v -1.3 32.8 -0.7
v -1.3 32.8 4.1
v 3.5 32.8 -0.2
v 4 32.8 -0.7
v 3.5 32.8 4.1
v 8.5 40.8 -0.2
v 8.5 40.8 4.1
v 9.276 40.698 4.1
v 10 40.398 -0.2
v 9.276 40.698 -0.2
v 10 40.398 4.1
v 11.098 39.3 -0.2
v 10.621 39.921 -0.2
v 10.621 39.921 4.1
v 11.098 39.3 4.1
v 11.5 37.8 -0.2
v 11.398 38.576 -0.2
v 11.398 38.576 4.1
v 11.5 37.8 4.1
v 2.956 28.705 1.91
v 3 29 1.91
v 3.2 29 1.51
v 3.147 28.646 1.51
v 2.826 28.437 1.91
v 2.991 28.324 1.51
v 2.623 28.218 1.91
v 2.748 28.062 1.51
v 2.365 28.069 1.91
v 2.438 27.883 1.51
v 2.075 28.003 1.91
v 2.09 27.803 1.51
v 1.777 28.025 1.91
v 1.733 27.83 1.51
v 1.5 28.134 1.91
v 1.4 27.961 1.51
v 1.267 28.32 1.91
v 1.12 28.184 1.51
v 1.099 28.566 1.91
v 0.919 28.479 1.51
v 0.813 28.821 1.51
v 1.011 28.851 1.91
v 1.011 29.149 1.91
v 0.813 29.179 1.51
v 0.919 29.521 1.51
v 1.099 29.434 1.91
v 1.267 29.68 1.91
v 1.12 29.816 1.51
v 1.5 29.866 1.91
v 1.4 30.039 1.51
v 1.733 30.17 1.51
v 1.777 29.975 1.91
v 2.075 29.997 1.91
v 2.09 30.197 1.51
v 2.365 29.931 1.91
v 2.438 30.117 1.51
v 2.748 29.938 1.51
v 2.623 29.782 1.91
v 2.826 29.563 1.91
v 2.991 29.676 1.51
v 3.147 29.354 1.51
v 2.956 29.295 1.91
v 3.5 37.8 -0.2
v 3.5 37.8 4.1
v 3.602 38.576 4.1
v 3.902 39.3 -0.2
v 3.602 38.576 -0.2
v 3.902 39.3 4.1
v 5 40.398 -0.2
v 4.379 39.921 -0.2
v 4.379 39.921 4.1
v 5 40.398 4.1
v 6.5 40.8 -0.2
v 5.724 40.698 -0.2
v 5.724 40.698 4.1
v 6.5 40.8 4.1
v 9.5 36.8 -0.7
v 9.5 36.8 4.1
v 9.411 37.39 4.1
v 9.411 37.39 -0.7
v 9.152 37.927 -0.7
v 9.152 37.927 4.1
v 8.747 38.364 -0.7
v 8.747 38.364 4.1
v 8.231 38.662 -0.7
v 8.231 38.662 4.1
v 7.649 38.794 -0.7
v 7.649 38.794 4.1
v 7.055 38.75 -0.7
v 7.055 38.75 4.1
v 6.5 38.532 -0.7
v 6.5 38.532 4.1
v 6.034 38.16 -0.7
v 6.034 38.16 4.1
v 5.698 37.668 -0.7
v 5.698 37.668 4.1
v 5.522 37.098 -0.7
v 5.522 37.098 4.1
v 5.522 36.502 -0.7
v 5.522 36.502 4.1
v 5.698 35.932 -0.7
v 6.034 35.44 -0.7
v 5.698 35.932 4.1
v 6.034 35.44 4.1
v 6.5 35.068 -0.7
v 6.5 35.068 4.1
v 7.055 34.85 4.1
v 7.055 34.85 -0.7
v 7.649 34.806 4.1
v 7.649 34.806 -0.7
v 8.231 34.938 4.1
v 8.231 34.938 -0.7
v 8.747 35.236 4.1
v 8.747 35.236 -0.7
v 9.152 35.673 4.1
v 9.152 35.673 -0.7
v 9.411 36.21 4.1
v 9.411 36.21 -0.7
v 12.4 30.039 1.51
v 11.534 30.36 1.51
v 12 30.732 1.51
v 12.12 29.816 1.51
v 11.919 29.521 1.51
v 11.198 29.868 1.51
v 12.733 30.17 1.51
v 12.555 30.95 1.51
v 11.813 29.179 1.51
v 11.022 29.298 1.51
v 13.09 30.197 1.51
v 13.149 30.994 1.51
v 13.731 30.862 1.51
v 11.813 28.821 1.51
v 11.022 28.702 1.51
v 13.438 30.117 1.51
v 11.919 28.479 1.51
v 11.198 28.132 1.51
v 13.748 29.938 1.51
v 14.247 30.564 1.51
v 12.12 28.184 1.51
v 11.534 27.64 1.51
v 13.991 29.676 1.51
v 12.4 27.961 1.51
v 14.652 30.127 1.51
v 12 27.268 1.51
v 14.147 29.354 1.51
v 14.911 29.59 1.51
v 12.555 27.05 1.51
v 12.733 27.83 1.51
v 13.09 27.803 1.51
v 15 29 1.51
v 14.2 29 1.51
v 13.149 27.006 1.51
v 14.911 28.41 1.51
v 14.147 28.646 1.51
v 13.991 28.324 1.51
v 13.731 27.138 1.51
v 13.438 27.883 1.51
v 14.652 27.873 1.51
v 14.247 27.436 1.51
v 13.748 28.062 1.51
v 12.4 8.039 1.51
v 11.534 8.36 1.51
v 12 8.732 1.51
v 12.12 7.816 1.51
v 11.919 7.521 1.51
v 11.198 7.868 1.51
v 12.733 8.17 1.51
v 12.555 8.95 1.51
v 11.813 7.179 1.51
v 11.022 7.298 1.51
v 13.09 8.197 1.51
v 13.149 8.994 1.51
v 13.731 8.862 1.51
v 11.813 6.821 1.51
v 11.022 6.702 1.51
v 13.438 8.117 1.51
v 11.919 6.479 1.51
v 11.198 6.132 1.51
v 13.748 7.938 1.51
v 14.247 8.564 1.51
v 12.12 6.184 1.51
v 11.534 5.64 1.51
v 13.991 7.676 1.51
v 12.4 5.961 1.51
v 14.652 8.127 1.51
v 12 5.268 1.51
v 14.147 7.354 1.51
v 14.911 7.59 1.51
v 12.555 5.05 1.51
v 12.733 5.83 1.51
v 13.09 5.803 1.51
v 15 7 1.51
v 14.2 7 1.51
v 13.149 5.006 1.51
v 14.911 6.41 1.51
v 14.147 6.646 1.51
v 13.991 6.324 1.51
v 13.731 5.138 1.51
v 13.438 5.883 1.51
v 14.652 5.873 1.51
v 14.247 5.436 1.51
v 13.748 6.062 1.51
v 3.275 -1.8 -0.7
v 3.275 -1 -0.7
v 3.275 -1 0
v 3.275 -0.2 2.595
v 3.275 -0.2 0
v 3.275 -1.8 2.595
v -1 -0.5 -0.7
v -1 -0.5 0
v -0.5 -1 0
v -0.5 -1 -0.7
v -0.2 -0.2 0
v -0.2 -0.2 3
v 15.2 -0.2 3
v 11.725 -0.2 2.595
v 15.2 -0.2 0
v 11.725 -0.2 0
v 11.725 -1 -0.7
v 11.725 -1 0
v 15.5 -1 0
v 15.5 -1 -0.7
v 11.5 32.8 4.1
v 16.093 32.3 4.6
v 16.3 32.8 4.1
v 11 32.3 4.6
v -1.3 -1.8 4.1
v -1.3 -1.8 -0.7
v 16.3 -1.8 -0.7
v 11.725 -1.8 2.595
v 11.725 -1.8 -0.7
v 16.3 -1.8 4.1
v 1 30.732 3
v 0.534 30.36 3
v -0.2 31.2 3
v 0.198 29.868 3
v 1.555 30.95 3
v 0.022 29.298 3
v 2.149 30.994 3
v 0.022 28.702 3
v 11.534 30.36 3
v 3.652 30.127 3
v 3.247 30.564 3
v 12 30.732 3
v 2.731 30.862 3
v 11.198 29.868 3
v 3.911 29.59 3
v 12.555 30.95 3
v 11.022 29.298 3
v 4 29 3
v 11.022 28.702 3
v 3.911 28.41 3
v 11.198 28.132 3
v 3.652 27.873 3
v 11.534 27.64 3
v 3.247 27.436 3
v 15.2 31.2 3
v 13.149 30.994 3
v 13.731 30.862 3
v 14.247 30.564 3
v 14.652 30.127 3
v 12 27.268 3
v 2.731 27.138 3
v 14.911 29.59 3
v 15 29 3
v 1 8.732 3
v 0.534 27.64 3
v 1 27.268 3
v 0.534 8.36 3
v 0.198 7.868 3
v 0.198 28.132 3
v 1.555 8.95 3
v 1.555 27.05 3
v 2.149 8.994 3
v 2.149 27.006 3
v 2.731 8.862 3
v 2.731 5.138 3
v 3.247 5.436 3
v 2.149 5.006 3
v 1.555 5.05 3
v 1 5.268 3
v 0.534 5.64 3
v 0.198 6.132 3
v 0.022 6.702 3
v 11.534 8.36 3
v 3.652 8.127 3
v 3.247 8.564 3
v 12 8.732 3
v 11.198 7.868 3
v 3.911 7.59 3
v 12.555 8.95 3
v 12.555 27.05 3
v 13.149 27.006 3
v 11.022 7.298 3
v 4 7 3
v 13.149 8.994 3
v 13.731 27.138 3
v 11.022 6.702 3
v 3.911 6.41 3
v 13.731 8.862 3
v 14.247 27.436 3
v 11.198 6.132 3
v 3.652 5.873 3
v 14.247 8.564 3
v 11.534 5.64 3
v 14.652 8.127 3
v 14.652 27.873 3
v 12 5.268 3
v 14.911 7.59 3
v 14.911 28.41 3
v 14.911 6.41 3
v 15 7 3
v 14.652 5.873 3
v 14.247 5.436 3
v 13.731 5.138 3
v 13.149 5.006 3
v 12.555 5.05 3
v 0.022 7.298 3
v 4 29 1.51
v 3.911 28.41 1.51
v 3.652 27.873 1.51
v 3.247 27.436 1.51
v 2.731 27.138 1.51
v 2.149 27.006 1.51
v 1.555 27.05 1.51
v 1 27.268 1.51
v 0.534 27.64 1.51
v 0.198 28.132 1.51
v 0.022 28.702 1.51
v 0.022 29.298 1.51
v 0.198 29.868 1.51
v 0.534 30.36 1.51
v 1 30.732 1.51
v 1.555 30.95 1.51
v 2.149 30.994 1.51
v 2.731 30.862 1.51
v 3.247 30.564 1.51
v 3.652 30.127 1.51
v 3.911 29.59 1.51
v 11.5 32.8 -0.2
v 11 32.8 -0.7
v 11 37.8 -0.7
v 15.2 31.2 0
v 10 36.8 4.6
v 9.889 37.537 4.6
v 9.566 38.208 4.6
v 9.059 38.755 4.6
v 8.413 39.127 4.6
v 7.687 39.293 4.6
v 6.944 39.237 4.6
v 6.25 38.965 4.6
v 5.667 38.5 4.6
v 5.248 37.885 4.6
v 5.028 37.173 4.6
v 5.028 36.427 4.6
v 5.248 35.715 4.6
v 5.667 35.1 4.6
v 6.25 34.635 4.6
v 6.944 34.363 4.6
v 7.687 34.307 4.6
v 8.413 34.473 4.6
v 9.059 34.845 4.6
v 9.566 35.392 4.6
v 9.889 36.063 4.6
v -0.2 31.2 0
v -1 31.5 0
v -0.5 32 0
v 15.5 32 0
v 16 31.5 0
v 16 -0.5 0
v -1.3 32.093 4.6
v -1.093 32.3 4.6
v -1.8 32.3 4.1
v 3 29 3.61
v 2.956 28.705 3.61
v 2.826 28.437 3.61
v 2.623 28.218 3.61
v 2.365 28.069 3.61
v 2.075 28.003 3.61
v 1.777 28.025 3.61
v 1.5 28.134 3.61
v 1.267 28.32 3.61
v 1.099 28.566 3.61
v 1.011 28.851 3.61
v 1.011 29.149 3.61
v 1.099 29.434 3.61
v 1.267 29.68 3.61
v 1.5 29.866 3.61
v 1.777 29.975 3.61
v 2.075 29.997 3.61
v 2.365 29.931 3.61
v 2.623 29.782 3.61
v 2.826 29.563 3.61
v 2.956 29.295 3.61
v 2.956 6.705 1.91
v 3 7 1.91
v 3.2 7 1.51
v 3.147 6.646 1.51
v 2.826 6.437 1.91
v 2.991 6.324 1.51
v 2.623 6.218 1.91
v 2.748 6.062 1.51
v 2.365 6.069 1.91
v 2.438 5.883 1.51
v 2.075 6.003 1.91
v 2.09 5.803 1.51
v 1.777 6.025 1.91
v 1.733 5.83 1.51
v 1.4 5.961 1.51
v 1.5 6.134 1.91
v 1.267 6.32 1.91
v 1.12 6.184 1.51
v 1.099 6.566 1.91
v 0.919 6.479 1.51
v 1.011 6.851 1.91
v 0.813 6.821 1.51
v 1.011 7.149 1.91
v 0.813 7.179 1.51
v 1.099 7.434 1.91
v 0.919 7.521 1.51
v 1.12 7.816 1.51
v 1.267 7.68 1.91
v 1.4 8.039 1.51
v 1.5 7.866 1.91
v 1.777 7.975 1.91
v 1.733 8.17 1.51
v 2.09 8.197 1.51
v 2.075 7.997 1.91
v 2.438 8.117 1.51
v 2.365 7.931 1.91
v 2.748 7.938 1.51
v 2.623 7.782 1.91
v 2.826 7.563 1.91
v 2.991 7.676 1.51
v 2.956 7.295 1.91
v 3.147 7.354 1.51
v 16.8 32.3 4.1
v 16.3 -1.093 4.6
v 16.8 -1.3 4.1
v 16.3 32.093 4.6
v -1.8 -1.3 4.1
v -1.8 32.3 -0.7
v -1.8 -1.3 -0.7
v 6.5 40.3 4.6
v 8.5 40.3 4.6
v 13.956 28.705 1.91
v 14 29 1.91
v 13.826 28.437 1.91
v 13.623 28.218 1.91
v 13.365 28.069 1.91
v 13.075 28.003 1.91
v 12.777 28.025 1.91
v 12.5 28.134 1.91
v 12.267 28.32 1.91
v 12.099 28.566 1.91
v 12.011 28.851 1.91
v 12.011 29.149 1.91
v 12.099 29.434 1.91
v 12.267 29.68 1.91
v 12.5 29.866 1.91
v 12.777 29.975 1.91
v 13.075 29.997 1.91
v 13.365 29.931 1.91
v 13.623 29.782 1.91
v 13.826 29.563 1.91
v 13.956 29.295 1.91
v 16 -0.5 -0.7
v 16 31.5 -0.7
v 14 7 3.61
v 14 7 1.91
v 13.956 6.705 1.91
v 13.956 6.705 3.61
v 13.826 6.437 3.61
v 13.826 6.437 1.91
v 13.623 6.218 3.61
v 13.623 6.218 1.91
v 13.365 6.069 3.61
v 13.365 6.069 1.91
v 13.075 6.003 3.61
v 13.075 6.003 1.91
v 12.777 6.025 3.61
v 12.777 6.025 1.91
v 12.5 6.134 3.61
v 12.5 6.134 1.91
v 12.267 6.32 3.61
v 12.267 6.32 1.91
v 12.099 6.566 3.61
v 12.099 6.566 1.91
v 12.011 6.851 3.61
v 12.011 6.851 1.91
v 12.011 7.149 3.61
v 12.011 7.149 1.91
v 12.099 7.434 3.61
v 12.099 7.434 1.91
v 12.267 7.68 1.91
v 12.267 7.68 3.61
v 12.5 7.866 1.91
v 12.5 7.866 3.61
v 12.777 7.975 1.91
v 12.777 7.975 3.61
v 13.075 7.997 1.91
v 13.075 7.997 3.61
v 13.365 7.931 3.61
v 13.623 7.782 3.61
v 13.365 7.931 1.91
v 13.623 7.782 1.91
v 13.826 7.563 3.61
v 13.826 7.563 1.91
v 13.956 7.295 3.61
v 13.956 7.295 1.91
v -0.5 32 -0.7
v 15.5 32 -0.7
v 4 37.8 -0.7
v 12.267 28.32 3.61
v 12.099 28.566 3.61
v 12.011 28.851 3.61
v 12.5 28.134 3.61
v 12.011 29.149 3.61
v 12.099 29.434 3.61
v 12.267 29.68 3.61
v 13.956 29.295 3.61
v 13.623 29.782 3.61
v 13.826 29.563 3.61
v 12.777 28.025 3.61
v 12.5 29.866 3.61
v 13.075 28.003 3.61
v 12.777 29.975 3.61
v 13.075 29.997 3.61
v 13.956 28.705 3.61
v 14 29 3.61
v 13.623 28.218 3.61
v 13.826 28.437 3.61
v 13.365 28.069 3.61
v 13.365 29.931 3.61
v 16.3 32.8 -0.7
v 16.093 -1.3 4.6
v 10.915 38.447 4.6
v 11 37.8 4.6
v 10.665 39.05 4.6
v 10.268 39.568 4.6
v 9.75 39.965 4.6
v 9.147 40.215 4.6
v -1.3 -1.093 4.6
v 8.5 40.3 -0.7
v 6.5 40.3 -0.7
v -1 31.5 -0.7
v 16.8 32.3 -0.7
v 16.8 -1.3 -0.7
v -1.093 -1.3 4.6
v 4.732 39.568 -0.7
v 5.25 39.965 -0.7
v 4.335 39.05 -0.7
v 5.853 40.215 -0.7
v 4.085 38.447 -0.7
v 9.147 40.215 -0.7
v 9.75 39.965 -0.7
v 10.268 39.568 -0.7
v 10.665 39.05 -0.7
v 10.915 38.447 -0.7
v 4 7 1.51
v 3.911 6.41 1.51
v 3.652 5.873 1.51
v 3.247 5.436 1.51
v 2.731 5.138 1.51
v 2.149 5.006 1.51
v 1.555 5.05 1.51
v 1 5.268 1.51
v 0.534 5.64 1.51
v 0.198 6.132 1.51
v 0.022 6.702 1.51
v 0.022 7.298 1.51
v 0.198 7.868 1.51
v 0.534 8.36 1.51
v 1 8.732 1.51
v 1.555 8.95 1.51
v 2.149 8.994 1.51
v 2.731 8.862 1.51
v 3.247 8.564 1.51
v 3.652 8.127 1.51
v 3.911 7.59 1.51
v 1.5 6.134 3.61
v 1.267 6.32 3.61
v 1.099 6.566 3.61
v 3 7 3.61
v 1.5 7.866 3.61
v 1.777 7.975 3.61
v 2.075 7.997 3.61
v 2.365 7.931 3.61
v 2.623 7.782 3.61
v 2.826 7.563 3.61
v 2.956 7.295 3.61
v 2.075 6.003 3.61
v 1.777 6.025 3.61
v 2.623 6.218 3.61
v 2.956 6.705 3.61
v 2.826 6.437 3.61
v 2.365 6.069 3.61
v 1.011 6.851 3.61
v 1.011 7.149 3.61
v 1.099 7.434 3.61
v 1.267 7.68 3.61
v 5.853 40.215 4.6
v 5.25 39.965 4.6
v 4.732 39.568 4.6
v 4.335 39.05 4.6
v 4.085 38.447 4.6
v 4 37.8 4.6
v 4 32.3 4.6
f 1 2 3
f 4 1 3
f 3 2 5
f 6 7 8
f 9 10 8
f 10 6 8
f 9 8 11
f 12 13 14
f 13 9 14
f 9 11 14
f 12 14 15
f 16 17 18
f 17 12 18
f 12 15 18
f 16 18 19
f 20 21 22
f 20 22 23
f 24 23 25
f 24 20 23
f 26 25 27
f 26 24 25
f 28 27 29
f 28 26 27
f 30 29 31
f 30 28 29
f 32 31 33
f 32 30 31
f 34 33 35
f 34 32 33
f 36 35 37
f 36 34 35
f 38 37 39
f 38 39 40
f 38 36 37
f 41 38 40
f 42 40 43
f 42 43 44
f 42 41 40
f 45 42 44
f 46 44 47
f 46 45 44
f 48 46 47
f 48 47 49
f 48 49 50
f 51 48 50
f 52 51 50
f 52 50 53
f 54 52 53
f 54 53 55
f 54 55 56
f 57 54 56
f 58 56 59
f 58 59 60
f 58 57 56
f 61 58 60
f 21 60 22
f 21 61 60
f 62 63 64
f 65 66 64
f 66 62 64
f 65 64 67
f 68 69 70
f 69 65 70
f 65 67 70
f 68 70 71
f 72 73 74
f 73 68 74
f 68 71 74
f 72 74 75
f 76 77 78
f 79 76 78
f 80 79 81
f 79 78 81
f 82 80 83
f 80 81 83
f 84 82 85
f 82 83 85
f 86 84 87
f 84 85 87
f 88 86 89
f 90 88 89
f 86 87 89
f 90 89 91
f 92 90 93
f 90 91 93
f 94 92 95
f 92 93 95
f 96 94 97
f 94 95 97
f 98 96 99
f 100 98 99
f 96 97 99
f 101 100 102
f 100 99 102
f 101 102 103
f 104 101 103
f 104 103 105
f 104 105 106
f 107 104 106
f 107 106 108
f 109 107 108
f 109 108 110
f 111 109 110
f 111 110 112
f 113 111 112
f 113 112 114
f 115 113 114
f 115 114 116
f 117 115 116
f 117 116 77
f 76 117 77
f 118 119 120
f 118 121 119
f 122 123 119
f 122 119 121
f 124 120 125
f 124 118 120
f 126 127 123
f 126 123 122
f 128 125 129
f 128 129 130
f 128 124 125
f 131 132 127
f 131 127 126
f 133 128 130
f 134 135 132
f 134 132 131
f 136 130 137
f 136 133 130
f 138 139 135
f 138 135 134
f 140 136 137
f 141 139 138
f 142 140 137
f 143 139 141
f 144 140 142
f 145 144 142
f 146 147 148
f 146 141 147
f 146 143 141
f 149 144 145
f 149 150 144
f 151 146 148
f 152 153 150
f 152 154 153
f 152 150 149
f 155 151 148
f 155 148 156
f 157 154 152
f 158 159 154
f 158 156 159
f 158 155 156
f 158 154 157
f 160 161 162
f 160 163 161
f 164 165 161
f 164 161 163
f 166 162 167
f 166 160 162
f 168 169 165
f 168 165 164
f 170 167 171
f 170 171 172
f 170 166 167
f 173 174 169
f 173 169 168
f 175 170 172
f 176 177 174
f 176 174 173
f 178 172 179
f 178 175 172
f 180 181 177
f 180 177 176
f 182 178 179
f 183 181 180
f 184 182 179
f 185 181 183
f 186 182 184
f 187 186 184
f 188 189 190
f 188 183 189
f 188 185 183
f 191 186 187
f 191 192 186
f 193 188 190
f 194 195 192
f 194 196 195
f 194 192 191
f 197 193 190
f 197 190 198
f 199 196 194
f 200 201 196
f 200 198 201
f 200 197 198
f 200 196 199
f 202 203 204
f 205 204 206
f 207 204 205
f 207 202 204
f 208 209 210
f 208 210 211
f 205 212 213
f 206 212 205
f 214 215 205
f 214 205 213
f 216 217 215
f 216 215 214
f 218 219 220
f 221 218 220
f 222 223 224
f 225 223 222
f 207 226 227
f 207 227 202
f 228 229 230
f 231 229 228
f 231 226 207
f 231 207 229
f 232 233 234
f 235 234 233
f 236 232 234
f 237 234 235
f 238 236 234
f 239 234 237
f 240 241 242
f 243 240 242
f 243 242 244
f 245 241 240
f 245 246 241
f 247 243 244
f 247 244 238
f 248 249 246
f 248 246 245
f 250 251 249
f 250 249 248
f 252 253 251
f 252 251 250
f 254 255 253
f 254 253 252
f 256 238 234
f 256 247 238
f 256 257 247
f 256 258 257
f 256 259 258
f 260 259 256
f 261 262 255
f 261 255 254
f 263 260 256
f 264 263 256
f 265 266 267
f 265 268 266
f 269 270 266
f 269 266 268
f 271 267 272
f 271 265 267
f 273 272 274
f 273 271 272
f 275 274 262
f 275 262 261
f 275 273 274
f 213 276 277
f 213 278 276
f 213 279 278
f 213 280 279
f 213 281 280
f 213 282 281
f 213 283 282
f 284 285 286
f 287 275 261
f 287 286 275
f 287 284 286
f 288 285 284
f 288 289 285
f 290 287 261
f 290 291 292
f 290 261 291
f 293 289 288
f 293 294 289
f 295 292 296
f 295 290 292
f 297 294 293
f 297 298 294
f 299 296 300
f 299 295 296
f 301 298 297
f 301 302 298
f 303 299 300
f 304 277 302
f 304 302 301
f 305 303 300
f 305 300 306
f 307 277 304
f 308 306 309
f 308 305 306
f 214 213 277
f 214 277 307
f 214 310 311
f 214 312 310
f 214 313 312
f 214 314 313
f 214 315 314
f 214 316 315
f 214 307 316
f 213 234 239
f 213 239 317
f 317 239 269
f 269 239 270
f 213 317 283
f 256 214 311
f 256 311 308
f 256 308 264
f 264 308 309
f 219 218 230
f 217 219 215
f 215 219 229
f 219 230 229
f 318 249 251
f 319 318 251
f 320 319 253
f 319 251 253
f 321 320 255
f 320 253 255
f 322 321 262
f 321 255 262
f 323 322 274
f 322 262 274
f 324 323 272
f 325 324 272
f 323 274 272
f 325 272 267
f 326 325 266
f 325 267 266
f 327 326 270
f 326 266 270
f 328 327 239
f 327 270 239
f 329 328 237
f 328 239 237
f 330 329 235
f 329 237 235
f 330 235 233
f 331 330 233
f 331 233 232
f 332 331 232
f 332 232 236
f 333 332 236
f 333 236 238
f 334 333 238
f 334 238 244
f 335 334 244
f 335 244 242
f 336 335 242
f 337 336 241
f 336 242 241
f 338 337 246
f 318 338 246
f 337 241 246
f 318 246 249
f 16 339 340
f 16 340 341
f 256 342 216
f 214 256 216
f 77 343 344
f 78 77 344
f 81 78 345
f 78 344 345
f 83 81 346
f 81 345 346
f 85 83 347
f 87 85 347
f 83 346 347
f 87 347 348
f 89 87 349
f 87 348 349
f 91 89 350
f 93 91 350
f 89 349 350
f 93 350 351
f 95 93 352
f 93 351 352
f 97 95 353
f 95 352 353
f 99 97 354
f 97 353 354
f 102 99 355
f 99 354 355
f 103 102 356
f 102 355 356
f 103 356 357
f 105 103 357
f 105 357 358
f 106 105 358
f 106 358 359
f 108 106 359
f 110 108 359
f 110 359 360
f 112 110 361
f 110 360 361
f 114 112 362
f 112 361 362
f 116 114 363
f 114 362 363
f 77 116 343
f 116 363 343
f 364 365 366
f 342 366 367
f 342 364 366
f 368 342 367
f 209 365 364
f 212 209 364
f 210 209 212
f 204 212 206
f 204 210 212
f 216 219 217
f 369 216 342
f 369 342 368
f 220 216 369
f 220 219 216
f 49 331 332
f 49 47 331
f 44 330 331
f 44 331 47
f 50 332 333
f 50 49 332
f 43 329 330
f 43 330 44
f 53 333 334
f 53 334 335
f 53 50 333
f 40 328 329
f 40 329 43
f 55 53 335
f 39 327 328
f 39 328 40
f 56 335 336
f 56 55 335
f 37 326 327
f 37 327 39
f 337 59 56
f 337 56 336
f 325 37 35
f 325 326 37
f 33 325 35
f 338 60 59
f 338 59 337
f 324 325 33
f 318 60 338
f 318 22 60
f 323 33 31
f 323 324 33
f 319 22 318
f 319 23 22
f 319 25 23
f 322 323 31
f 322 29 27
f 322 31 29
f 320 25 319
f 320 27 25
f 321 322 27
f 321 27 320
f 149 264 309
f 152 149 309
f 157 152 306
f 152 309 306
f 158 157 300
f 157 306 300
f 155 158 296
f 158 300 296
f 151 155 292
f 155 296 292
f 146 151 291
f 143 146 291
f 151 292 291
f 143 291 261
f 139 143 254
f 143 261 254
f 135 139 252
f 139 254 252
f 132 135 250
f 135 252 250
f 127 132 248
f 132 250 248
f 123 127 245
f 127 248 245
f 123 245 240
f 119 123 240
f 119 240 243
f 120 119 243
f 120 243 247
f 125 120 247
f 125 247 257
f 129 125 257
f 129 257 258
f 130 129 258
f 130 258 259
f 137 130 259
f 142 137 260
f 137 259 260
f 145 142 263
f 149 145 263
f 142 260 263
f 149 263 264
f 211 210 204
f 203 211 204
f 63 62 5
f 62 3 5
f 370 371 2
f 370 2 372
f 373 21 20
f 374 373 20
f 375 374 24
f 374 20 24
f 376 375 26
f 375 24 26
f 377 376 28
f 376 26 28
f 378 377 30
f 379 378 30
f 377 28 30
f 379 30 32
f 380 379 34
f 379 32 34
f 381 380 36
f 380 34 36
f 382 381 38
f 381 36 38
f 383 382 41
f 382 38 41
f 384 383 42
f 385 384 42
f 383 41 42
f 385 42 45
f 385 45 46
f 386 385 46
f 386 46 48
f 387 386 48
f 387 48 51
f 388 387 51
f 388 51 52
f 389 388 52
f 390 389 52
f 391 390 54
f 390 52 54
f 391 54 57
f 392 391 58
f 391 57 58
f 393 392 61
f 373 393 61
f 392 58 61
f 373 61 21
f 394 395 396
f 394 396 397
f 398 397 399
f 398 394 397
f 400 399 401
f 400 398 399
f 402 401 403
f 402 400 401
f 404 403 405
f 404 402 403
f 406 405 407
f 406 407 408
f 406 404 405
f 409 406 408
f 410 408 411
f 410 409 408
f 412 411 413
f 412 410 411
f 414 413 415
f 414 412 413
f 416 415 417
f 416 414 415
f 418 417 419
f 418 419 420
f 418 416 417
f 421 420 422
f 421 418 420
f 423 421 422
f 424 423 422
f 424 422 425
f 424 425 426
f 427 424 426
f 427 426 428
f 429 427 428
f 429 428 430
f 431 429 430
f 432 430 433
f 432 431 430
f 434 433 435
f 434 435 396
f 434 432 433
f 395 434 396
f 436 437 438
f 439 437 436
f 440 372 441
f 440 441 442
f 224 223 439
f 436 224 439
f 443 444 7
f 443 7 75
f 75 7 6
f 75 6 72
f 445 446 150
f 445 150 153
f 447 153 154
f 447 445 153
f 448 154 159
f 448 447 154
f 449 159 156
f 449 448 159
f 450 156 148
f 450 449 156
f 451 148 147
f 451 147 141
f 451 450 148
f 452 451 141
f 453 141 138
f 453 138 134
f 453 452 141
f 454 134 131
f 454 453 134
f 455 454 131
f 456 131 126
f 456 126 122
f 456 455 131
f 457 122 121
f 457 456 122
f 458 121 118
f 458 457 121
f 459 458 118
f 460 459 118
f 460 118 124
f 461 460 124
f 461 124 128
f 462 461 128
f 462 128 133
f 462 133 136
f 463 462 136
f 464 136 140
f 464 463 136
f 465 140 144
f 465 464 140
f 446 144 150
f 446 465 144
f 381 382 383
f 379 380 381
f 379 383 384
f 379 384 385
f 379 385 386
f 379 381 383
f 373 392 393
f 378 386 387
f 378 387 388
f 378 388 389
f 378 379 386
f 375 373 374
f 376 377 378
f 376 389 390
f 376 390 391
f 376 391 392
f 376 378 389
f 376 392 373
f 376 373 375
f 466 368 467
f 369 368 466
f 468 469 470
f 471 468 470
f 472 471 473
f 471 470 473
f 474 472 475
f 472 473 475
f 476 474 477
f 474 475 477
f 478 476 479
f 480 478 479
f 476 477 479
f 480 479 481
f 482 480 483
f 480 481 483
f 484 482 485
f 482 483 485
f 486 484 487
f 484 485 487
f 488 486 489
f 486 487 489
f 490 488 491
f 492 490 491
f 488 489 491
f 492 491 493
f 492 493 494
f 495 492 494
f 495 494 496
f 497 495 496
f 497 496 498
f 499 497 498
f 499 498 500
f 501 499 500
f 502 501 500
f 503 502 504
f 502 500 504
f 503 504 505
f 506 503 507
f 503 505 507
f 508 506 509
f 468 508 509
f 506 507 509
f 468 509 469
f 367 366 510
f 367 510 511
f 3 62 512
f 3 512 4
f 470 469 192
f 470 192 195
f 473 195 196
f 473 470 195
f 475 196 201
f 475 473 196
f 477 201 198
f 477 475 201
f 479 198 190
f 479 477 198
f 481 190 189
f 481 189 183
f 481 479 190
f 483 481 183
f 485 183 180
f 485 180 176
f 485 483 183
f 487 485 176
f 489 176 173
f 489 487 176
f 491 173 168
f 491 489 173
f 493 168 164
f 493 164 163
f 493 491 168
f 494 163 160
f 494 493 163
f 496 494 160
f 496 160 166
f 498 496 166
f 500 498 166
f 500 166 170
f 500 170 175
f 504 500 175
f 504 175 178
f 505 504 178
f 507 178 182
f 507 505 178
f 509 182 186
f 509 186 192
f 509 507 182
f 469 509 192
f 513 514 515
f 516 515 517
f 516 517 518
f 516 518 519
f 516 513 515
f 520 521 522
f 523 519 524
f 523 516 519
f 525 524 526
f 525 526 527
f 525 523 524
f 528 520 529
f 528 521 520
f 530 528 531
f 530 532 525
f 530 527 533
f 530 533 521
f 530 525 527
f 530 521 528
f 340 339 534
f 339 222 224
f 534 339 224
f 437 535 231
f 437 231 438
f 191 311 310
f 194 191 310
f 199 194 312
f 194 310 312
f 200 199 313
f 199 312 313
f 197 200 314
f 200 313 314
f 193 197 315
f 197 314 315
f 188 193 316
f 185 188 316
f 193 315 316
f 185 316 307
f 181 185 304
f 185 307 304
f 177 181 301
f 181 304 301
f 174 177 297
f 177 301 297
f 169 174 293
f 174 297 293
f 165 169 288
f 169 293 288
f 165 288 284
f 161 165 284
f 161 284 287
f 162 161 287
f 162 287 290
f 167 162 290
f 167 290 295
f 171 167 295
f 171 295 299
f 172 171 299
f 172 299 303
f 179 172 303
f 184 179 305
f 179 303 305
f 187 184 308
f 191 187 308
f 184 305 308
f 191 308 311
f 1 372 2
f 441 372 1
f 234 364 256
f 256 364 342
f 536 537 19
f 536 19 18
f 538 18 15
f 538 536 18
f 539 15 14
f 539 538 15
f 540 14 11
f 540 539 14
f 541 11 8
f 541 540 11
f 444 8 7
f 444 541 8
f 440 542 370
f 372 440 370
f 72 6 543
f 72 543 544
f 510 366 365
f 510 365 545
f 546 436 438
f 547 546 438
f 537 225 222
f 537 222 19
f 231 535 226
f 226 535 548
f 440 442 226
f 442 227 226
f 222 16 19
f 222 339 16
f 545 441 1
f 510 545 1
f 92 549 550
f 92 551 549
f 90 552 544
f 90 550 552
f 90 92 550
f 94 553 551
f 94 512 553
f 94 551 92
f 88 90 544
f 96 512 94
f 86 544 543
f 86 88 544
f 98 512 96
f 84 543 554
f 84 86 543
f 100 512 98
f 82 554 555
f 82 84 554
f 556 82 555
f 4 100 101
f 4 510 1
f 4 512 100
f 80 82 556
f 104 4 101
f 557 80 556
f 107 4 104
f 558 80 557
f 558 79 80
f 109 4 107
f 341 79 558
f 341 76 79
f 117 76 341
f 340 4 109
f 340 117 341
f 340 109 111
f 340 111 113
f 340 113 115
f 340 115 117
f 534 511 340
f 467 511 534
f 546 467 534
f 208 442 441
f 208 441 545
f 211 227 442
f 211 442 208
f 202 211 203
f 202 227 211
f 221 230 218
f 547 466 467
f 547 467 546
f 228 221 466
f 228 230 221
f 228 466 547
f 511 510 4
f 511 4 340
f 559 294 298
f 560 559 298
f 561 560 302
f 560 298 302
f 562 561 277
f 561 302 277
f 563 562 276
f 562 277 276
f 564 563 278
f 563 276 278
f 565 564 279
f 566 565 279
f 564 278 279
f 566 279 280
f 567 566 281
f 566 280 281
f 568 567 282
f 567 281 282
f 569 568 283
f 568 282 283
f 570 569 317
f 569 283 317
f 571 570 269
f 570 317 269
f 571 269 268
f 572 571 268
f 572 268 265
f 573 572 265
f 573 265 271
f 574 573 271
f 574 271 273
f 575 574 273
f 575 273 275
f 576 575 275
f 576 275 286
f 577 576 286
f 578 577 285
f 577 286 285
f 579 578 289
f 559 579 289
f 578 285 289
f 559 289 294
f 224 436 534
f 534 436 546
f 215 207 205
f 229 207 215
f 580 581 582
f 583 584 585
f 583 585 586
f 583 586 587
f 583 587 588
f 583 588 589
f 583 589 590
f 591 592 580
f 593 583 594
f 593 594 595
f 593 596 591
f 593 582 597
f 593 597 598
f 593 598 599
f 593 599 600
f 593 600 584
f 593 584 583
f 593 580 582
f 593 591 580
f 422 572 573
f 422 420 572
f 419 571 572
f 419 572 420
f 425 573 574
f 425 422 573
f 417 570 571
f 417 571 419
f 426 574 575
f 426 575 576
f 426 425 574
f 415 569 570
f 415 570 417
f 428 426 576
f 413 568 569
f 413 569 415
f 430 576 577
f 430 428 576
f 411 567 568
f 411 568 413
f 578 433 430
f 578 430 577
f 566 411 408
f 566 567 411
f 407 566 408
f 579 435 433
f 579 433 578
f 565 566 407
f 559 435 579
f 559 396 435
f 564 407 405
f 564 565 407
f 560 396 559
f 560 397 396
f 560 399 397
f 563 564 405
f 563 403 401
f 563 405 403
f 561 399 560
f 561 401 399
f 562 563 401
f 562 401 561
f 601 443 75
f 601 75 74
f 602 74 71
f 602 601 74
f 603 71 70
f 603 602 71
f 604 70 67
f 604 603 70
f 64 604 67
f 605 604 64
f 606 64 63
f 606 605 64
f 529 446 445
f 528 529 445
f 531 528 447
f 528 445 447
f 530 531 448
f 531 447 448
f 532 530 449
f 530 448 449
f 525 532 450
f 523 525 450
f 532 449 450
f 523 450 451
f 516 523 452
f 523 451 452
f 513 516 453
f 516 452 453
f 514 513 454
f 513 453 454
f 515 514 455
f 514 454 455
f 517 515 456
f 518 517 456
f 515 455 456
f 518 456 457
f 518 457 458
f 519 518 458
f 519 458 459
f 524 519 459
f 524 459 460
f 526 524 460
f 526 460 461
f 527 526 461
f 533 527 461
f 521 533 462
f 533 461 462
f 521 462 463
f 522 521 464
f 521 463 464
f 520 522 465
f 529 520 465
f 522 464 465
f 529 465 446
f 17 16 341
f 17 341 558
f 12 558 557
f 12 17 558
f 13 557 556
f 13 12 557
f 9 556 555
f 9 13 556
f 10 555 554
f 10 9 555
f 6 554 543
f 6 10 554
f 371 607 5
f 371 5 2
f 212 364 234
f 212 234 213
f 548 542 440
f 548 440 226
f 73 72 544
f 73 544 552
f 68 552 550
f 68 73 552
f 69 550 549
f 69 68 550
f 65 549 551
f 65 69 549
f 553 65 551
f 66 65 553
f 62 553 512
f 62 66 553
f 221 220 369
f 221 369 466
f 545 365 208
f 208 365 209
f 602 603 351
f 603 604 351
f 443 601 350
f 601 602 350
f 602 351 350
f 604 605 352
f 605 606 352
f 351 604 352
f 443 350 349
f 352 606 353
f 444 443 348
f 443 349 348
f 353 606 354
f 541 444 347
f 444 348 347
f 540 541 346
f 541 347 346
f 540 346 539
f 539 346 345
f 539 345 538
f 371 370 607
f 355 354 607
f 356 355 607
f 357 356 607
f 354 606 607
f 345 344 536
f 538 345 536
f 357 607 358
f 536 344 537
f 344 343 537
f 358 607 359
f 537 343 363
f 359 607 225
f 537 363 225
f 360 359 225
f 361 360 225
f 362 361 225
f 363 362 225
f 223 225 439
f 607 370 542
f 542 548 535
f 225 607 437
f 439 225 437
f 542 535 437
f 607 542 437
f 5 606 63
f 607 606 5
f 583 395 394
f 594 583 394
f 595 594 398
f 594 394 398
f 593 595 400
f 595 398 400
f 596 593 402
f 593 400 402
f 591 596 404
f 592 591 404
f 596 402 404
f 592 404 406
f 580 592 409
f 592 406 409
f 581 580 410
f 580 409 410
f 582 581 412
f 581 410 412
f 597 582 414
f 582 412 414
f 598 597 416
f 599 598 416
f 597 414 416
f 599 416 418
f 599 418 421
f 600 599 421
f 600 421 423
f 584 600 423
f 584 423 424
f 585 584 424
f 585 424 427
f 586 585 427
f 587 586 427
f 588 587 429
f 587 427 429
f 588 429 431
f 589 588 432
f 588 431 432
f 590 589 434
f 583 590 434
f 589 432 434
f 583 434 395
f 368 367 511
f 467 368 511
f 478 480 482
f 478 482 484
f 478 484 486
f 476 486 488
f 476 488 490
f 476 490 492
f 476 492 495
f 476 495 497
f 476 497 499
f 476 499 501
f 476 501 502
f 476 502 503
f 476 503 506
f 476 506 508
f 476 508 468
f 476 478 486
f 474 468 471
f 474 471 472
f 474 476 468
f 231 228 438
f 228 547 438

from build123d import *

# Parameters (mm, degrees)
SKETCH_W           = 15.4
SKETCH_H           = 31.4
PAD_DEPTH          = 3
THICKNESS_T        = 1.6
SKETCH001_W        = 18.6
SKETCH001_H        = 34.6
SKETCH001_W_2      = 17
SKETCH001_H_2      = 33
PAD001_DEPTH       = 0.7
SKETCH002_W        = 8.45
SKETCH002_H        = 3.295
POCKET_DEPTH       = 5
SKETCH003_R        = 2
PAD002_DEPTH       = 1.49
SKETCH004_R        = 1
POCKET001_DEPTH    = 2.1
SKETCH009_W        = 8
SKETCH009_H        = 5.3
PAD006_DEPTH       = 8
SKETCH010_R        = 2
POCKET002_DEPTH    = 5.301
FILLET_R           = 3
CHAMFER_SIZE       = 0.5
CHAMFER001_SIZE    = 0.5
CHAMFER005_1_SIZE2 = 0.4
CHAMFER005_1_SIZE  = 0.2
CHAMFER005_2_SIZE2 = 0.4
CHAMFER005_2_SIZE  = 0.2
CHAMFER005_3_SIZE2 = 0.4
CHAMFER005_3_SIZE  = 0.2
CHAMFER005_4_SIZE2 = 0.4
CHAMFER005_4_SIZE  = 0.2


with BuildPart() as part:
    # Sketch (on Face2746 of Binder) → Pad (new body)
    with BuildSketch(Plane(origin=(0, 0, 0), x_dir=(1, 0, 0), z_dir=(0, 0, -1))):
        with Locations((7.5, -15.5)):
            Rectangle(SKETCH_W, SKETCH_H)
    extrude(amount=-PAD_DEPTH)

    # Thickness
    thickness_openings = [part.faces().sort_by_distance(p)[0] for p in [
        (7.5, 15.5, 0),
    ]]
    offset(amount=THICKNESS_T, openings=thickness_openings, kind=Kind.INTERSECTION)

    # Sketch001 (on Face6 of Thickness) → Pad001 (join)
    with BuildSketch(Plane(origin=(0, 0, 0), x_dir=(1, 0, 0), z_dir=(0, 0, -1))):
        with Locations((7.5, -15.5)):
            Rectangle(SKETCH001_W, SKETCH001_H)
        with Locations((7.5, -15.5)):
            Rectangle(SKETCH001_W_2, SKETCH001_H_2, mode=Mode.SUBTRACT)
    extrude(amount=PAD001_DEPTH)

    # Sketch002 (on Face16 of Pad001) → Pocket (cut)
    with BuildSketch(Plane.XZ.offset(1.8)):
        with Locations((7.5, 0.9475)):
            Rectangle(SKETCH002_W, SKETCH002_H)
    extrude(amount=-POCKET_DEPTH, mode=Mode.SUBTRACT)

    # Sketch003 (on Face18 of Pocket) → Pad002 (join)
    with BuildSketch(Plane(origin=(0, 0, 3), x_dir=(1, 0, 0), z_dir=(0, 0, -1))):
        with Locations((2, -7)):
            Circle(SKETCH003_R)
        with Locations((13, -7)):
            Circle(SKETCH003_R)
        with Locations((2, -29)):
            Circle(SKETCH003_R)
        with Locations((13, -29)):
            Circle(SKETCH003_R)
    extrude(amount=PAD002_DEPTH)

    # Sketch004 (on Face25 of Pad002) → Pocket001 (cut)
    with BuildSketch(Plane(origin=(0, 0, 1.51), x_dir=(1, 0, 0), z_dir=(0, 0, -1))):
        with Locations((2, -7)):
            Circle(SKETCH004_R)
        with Locations((13, -7)):
            Circle(SKETCH004_R)
        with Locations((2, -29)):
            Circle(SKETCH004_R)
        with Locations((13, -29)):
            Circle(SKETCH004_R)
    extrude(amount=-POCKET001_DEPTH, mode=Mode.SUBTRACT)

    # Sketch009 (on Face3 of Pocket001) → Pad006 (join)
    with BuildSketch(Plane(origin=(0, 32.8, 0), x_dir=(-1, 0, 0), z_dir=(0, 1, 0))):
        with Locations((-7.5, 1.95)):
            Rectangle(SKETCH009_W, SKETCH009_H)
    extrude(amount=PAD006_DEPTH)

    # Sketch010 (on Face39 of Pad006) → Pocket002 (cut, through all)
    with BuildSketch(Plane.XY.offset(4.6)):
        with Locations((7.5, 36.8)):
            Circle(SKETCH010_R)
    extrude(amount=-POCKET002_DEPTH, mode=Mode.SUBTRACT)

    # Fillet
    fillet_edges = [part.edges().sort_by_distance(p)[0] for p in [
        (3.5, 40.8, 1.95),
        (11.5, 40.8, 1.95),
    ]]
    fillet(fillet_edges, radius=FILLET_R)

    # Chamfer
    chamfer_edges = [part.edges().sort_by_distance(p)[0] for p in [
        (-1.8, 32.8, 1.95),
        (16.8, 32.8, 1.95),
        (16.8, -1.8, 1.95),
        (-1.8, -1.8, 1.95),
        (16, -1, -0.35),
        (16, 32, -0.35),
        (-1, 32, -0.35),
        (-1, -1, -0.35),
    ]]
    chamfer(chamfer_edges, length=CHAMFER_SIZE)

    # Chamfer001
    chamfer001_edges = [part.edges().sort_by_distance(p)[0] for p in [
        (13.9, 32.8, 4.6),
        (16.55, 32.55, 4.6),
        (11.5, 35.3, 4.6),
        (16.8, 15.5, 4.6),
        (10.62132, 39.92132, 4.6),
        (16.55, -1.55, 4.6),
        (7.5, 40.8, 4.6),
        (7.5, -1.8, 4.6),
        (4.37868, 39.92132, 4.6),
        (-1.55, -1.55, 4.6),
        (3.5, 35.3, 4.6),
        (-1.8, 15.5, 4.6),
        (1.1, 32.8, 4.6),
        (-1.55, 32.55, 4.6),
        (5.5, 36.8, 4.6),
        (11.5, 35.3, -0.7),
        (10.62132, 39.92132, -0.7),
        (7.5, 40.8, -0.7),
        (4.37868, 39.92132, -0.7),
        (3.5, 35.3, -0.7),
    ]]
    chamfer(chamfer001_edges, length=CHAMFER001_SIZE)

    # Chamfer005 1
    chamfer005_1_edges = [part.edges().sort_by_distance(p)[0] for p in [
        (1, 7, 1.51),
    ]]
    chamfer005_1_side = part.faces().sort_by_distance((0.056569, 7, 1.51))[0]
    chamfer(chamfer005_1_edges, length=CHAMFER005_1_SIZE, length2=CHAMFER005_1_SIZE2, reference=chamfer005_1_side)

    # Chamfer005 2
    chamfer005_2_edges = [part.edges().sort_by_distance(p)[0] for p in [
        (12, 7, 1.51),
    ]]
    chamfer005_2_side = part.faces().sort_by_distance((11.056569, 7, 1.51))[0]
    chamfer(chamfer005_2_edges, length=CHAMFER005_2_SIZE, length2=CHAMFER005_2_SIZE2, reference=chamfer005_2_side)

    # Chamfer005 3
    chamfer005_3_edges = [part.edges().sort_by_distance(p)[0] for p in [
        (1, 29, 1.51),
    ]]
    chamfer005_3_side = part.faces().sort_by_distance((0.056569, 29, 1.51))[0]
    chamfer(chamfer005_3_edges, length=CHAMFER005_3_SIZE, length2=CHAMFER005_3_SIZE2, reference=chamfer005_3_side)

    # Chamfer005 4
    chamfer005_4_edges = [part.edges().sort_by_distance(p)[0] for p in [
        (12, 29, 1.51),
    ]]
    chamfer005_4_side = part.faces().sort_by_distance((11.056569, 29, 1.51))[0]
    chamfer(chamfer005_4_edges, length=CHAMFER005_4_SIZE, length2=CHAMFER005_4_SIZE2, reference=chamfer005_4_side)


solid = part.part
